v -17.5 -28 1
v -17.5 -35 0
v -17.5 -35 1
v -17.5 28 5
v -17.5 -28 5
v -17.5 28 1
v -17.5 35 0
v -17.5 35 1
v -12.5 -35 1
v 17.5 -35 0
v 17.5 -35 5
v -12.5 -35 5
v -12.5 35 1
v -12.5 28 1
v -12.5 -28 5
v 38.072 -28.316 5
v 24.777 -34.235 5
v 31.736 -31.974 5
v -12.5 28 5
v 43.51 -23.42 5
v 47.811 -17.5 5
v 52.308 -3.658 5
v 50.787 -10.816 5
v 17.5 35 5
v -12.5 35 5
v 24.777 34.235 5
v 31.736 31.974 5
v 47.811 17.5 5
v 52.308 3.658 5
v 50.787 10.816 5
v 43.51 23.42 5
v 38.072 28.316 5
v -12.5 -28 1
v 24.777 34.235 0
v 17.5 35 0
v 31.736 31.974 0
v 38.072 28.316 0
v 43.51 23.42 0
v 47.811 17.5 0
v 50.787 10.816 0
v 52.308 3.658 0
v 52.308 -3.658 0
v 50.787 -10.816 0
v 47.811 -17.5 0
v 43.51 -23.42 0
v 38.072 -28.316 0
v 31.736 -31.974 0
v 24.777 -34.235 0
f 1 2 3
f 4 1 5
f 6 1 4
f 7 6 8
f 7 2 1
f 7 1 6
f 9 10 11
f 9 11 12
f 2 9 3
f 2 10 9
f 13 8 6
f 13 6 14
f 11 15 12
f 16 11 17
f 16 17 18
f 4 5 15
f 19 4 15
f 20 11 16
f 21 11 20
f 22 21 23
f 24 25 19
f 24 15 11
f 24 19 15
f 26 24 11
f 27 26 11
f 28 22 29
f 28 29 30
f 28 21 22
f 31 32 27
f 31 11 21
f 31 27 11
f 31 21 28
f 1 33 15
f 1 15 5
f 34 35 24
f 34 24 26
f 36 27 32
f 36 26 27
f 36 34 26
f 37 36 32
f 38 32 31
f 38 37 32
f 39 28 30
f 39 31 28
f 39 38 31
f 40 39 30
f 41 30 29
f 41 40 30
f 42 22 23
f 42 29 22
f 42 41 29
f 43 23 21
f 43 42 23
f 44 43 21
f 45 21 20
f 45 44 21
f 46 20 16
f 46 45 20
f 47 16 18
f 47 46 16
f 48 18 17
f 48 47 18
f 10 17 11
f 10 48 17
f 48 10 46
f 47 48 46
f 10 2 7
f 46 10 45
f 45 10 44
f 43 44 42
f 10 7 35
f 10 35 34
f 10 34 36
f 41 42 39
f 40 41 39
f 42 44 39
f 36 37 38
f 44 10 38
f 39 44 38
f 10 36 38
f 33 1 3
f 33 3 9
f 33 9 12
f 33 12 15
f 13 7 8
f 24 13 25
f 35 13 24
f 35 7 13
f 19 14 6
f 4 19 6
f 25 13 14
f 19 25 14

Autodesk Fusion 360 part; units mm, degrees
sketch "Esquisse1" plane through (0, 0, 0) normal (0, 0, 1) x (1, 0, 0)
  circle A0 centre (0, 0) radius 27.9
  circle A1 centre (0, 0) radius 28.9
  dimension "d1" = 55.8
  dimension "d2" = 57.8
extrude "Extrusion1" add sketch "Esquisse1" along normal blind 1

Autodesk Fusion 360 part; units mm, degrees
sketch "Esquisse1" plane through (0, 0, 0) normal (0, 0, 1) x (1, 0, 0)
  line L0 (-17.5, 35) -> (17.5, 35)
  line L1 (17.5, 35) -> (17.5, -35)
  line L2 (17.5, -35) -> (-17.5, -35)
  line L3 (-17.5, -35) -> (-17.5, 35)
  line L4 (-17.5, 35) -> (17.5, -35) construction
  line L5 (17.5, 35) -> (-17.5, -35) construction
  arc A0 (17.5, -35) -> (17.5, 35) centre (17.5, 0) ccw
  line L6 (-17.5, 35) -> (-12.5, 35)
  line L7 (-12.5, 35) -> (-12.5, 28)
  line L8 (-12.5, 28) -> (-17.5, 28)
  line L9 (-17.5, 28) -> (-17.5, 35)
  line L10 (-17.5, -35) -> (-12.5, -35)
  line L11 (-12.5, -35) -> (-12.5, -28)
  line L12 (-12.5, -28) -> (-17.5, -28)
  line L13 (-17.5, -28) -> (-17.5, -35)
  dimension "d1" = 35
  dimension "d2" = 70
  dimension "d13" = 7
  dimension "d14" = 5
  dimension "d15" = 5
  dimension "d16" = 7
extrude "Extrusion1" add sketch "Esquisse1" along normal blind 5 contours L0 L1 L2 L3 L7 L8 L11 L12 | L1 A0
